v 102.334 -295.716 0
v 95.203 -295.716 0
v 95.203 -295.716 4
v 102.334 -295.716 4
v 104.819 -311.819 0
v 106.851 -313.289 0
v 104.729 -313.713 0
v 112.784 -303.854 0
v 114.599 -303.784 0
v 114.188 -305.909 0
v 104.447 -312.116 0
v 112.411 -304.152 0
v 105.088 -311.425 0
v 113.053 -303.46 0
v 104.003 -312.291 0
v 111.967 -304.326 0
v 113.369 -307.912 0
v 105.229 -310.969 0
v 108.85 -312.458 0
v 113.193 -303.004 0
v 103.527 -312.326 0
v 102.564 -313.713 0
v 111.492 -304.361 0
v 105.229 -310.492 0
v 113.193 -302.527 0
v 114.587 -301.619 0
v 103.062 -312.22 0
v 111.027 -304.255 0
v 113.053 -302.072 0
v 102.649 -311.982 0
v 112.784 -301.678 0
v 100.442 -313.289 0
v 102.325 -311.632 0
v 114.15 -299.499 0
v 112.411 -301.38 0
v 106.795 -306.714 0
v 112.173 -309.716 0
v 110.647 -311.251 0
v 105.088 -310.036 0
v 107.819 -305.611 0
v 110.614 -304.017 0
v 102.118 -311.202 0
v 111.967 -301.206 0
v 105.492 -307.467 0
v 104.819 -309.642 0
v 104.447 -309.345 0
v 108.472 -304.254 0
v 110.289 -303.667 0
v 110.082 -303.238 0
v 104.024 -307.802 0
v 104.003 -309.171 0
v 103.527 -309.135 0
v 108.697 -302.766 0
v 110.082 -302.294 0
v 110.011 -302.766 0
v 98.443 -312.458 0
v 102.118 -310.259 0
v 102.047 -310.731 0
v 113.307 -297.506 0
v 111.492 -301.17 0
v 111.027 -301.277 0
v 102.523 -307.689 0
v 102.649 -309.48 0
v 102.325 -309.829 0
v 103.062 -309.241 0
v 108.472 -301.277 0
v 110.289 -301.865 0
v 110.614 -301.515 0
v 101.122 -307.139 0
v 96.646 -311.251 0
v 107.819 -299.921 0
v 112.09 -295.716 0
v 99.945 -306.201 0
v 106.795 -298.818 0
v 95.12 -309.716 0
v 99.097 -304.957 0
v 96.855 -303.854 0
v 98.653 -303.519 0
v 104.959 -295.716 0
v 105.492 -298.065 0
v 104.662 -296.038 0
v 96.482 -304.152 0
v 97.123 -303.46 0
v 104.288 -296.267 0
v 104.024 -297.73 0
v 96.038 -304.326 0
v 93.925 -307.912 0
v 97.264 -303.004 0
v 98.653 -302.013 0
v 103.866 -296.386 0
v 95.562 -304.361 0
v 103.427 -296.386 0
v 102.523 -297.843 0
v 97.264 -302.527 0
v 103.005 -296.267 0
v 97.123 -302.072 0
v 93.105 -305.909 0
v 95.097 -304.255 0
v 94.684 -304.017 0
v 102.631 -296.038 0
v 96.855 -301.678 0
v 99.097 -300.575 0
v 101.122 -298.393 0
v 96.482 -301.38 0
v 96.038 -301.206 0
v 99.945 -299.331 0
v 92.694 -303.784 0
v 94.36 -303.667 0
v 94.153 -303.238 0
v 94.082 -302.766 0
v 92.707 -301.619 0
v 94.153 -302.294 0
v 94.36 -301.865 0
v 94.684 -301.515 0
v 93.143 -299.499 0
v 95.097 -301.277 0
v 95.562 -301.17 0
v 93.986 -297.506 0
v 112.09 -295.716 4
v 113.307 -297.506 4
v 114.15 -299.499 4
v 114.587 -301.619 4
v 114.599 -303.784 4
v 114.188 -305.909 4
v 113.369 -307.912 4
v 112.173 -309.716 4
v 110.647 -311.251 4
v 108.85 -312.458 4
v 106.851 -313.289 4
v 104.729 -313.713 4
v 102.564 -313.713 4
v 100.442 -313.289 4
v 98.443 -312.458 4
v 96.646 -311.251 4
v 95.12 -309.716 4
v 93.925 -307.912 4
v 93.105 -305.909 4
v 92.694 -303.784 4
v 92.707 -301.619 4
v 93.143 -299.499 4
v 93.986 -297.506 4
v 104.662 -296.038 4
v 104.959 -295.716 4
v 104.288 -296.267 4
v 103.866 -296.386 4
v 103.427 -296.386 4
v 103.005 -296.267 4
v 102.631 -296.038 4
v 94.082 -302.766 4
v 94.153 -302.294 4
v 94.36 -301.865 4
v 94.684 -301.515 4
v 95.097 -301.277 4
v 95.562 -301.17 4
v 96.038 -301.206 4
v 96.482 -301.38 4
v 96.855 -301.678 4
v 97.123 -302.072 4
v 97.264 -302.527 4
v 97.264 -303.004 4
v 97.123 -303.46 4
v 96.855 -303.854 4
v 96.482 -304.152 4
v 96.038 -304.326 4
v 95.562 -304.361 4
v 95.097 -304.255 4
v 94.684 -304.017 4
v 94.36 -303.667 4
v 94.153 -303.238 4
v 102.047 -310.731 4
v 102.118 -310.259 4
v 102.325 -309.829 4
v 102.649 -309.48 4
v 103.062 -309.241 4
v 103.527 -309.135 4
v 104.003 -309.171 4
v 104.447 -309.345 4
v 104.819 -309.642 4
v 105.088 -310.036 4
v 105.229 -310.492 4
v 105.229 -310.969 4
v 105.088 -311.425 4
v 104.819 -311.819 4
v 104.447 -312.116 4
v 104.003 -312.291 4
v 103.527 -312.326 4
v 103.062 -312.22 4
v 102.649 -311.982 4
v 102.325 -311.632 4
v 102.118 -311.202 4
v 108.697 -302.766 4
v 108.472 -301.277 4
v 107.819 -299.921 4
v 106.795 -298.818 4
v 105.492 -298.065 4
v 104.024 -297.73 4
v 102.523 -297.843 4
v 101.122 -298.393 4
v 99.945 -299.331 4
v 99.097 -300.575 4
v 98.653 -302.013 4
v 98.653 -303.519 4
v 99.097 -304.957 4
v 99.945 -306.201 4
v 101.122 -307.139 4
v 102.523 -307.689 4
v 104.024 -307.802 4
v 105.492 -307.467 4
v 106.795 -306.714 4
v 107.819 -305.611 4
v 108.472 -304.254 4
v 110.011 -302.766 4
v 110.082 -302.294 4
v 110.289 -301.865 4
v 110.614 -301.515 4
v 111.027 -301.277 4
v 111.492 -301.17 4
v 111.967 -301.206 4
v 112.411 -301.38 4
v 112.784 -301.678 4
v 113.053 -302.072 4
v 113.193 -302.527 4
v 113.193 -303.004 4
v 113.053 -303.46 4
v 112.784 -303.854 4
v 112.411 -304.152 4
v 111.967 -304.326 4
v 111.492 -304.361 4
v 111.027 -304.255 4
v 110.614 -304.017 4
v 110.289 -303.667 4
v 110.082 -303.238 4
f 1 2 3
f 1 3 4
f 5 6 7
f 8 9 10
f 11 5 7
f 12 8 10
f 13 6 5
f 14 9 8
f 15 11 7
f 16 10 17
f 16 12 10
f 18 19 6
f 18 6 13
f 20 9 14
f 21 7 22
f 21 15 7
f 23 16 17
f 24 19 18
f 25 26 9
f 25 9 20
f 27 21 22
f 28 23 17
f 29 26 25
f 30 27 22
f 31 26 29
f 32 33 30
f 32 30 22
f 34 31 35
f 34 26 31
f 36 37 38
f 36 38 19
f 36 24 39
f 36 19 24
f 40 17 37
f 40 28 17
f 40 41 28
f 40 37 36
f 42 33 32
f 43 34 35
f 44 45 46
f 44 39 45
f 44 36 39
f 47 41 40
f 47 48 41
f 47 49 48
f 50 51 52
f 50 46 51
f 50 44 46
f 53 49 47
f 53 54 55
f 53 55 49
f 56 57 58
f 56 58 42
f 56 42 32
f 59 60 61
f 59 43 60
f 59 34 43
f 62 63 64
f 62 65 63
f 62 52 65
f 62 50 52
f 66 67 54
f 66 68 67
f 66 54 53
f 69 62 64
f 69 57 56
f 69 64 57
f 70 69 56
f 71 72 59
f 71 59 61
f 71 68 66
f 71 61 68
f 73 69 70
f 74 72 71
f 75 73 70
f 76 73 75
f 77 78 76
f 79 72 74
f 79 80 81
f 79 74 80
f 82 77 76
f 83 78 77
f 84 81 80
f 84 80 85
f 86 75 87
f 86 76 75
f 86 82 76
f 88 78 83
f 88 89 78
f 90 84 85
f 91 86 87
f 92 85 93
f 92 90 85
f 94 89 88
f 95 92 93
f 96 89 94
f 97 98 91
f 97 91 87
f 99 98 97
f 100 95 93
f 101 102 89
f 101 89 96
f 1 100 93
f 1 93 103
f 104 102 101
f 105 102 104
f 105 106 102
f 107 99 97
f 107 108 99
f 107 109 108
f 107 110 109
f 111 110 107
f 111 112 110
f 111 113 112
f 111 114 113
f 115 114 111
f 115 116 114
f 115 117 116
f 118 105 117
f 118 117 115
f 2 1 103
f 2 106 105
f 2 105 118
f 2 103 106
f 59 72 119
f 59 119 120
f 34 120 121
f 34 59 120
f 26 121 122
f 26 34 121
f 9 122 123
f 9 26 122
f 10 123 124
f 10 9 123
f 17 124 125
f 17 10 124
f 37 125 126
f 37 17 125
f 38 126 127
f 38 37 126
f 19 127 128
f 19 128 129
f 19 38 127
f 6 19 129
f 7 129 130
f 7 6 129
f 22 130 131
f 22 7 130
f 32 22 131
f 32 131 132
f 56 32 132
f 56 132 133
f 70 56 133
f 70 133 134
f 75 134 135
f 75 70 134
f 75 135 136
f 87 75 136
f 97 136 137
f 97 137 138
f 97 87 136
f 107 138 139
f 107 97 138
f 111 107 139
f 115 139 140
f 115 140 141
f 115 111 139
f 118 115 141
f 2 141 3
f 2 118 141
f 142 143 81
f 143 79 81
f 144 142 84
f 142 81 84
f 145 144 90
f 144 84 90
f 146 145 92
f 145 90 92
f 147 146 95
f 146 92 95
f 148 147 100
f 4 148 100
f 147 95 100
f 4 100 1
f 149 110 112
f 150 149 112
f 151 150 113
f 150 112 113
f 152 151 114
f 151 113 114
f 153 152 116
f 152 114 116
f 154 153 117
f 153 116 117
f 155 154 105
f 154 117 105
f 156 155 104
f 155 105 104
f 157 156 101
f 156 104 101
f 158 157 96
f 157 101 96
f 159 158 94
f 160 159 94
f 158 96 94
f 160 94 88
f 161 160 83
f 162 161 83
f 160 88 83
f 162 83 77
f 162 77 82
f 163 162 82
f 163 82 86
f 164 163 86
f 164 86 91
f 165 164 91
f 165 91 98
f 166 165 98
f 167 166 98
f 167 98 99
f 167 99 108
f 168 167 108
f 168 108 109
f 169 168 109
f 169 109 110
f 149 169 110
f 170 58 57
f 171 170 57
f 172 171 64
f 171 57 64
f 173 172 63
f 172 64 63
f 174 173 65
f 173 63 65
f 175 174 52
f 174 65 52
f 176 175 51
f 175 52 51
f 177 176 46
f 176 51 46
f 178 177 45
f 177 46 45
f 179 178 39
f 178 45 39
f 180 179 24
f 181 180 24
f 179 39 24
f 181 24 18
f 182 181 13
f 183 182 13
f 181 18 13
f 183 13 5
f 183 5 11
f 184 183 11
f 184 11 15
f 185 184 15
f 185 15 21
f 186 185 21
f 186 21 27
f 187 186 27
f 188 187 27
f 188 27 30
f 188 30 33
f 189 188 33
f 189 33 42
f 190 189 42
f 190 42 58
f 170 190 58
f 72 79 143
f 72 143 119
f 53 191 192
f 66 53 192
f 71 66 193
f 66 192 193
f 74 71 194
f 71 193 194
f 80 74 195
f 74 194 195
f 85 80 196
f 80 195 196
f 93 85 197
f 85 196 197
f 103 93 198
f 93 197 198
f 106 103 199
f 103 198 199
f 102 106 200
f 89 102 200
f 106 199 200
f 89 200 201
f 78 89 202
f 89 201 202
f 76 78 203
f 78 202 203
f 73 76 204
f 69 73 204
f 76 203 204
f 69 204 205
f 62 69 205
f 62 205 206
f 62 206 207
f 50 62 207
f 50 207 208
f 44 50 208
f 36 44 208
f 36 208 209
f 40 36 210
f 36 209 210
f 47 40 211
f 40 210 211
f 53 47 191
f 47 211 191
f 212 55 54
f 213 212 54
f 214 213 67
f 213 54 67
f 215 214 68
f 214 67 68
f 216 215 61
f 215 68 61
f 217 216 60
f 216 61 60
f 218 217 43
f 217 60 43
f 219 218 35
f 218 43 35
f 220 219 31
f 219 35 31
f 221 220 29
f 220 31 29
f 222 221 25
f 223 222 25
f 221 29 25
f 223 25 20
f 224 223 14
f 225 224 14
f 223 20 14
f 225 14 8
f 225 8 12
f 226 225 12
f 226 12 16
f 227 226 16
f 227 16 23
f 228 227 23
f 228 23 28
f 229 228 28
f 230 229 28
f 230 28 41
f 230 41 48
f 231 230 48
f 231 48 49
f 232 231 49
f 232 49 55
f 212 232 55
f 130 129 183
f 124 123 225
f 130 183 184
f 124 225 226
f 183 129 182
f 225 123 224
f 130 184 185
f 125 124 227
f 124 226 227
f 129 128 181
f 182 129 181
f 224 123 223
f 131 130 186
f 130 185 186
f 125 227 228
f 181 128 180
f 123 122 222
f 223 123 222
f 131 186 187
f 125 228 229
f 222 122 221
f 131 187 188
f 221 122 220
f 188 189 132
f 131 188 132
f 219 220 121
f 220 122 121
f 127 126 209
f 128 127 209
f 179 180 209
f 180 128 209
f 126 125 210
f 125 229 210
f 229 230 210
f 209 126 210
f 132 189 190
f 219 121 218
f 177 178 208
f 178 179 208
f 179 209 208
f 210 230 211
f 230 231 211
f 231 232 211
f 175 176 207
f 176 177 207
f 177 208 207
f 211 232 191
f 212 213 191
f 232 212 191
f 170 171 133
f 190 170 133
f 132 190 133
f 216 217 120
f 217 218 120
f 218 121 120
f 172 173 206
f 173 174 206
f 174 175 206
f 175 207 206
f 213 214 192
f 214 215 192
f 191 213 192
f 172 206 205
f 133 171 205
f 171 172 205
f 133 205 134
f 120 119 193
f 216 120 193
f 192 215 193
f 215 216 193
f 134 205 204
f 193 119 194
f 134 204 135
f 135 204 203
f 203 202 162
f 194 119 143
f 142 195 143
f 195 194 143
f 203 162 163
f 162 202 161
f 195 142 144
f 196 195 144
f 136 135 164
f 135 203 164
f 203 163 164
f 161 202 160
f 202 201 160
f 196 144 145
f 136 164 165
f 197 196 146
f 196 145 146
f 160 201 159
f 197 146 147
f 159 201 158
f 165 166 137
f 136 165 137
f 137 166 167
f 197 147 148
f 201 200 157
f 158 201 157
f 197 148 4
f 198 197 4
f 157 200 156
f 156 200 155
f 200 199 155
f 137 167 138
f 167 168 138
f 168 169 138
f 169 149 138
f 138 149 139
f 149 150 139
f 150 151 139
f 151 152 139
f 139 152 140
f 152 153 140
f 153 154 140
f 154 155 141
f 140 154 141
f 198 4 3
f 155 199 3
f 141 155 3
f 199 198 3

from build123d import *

# Parameters (mm, degrees)
RESSALTO_EXTRUS_O1_DEPTH = 4
ESBO_O2_R                = 5.05
CORTE_EXTRUS_O1_DEPTH    = 4
M3_CLEARANCE_HOLE1_D     = 3.2


with BuildPart() as part:
    # Esboço1 → Ressalto-extrusão1 (new body)
    with BuildSketch(Plane.XY):
        with BuildLine():
            Line((95.202808527, -295.7159332), (112.09037792, -295.7159332))
            ThreePointArc((112.09037792, -295.7159332), (103.646593224, -313.7659332), (95.202808527, -295.7159332))
        make_face()
    extrude(amount=RESSALTO_EXTRUS_O1_DEPTH)

    # Esboço2 → Corte-extrusão1 (cut)
    with BuildSketch(Plane.XY.offset(4)):
        with Locations((103.646593224, -302.7659332)):
            Circle(ESBO_O2_R)
    extrude(amount=-CORTE_EXTRUS_O1_DEPTH, mode=Mode.SUBTRACT)

    # M3 Clearance Hole1 (through all)
    with Locations(Plane.XY.offset(4)):
        with Locations((95.681870132, -302.765933199), (111.611316315, -302.765933199), (103.646593224, -310.730656291), (103.646593224, -294.801210108)):
            Hole(M3_CLEARANCE_HOLE1_D / 2)


solid = part.part
